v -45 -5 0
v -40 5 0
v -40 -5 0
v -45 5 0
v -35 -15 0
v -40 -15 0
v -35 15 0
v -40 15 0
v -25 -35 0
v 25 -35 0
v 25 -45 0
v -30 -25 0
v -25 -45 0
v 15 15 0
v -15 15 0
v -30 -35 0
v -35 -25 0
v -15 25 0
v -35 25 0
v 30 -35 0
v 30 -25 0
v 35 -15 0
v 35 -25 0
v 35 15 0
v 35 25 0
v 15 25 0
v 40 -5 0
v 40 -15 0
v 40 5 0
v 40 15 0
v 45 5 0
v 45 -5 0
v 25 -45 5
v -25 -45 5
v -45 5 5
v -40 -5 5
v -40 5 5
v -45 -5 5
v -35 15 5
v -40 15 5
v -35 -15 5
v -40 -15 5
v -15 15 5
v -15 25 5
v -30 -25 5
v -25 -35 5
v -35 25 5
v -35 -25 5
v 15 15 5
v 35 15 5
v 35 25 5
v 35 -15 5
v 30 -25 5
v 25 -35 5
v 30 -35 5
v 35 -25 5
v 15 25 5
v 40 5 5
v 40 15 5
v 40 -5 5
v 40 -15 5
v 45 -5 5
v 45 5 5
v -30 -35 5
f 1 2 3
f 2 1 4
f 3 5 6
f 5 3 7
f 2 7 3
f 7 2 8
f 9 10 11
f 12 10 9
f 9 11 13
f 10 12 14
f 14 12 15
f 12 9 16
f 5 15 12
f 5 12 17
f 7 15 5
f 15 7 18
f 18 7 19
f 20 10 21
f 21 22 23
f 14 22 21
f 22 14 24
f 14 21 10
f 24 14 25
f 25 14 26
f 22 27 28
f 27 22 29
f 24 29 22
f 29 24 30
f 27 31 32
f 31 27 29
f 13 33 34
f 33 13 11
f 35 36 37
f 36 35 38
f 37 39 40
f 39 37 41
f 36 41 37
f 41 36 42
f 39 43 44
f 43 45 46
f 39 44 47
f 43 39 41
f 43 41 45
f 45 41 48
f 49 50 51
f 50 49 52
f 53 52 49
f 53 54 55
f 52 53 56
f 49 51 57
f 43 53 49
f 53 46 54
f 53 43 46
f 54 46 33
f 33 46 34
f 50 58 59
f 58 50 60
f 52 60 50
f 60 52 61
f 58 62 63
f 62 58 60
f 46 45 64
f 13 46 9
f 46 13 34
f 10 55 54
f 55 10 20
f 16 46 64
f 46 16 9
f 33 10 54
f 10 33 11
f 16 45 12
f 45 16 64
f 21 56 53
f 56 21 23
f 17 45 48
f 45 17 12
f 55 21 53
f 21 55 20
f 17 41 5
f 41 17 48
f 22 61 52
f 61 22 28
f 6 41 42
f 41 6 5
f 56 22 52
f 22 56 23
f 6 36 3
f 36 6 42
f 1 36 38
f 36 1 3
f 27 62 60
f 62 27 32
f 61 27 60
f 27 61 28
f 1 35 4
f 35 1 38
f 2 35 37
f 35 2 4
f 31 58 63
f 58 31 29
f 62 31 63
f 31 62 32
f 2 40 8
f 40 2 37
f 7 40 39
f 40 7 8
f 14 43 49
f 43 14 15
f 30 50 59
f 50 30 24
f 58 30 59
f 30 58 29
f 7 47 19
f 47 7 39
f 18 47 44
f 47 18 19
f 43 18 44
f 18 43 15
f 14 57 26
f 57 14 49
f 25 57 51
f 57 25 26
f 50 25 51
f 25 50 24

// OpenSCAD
// file: ../../src/semi_regular/tess_4_8_8.scad
/*
    Tessella: Semi-Regular Tessellation - 4.8.8
    ===========================================
    This module implements the tessellation of a plane using a semi-regular tiling
    pattern defined by the vertex configuration 4.8.8, where one square and two
    octagons meet at each vertex.
*/

include <../tessUtils.scad>;

/**
 * @brief Generates center points for an octagonal grid.
 *
 * Creates a 2D grid of center points for octagons spaced by the octagon's side length.
 *
 * @param radius The radius of each octagon.
 * @param n The number of octagons along the x-axis.
 * @param m The number of octagons along the y-axis.
 * @param rotate (Optional) Boolean to apply rotation to the grid, default is true.
 * @return An array of center points for octagons.
 */
function octagons_centers_rect(
    radius,
    n,
    m
) =
    let (
        side_length = (radius * 2) / (sqrt(4 + 2 * sqrt(2))), // Side length of the octagon
        total_width = side_length * (1 + sqrt(2)) // Total width including spacing
    ) squares_centers_rect(total_width, n, m);

/**
 * @brief Generates center points for the squares in a 4.8.8 tiling grid.
 *
 * Aligns the square centers with the octagonal centers by using a shifted grid,
 * creating the required semi-regular tiling pattern.
 *
 * @param radius The radius of the octagons.
 * @param n The number of octagons along the x-axis.
 * @param m The number of octagons along the y-axis.
 * @return An array of center points for squares.
 */
function squares_8_8_centers_rect(radius, n, m) =
    let (
        side_length = (radius * 2) / (sqrt(4 + 2 * sqrt(2))), // Side length of the octagon
        total_width = side_length * (1 + sqrt(2)), // Total width including spacing
        shift_x = total_width / 2, // Horizontal shift for squares
        shift_y = total_width / 2 // Vertical shift for squares
    ) [for (c = squares_centers_rect(total_width, n - 1, m - 1)) [c[0] + shift_x, c[1] + shift_y]];

/**
 * @brief Generates vertices for octagons based on radius and center points.
 *
 * Generates the vertices for octagons based on the provided center points and radius.
 *
 * @param radius The radius of each octagon.
 * @param centers Array of center points.
 * @param angular_offset (Optional) Rotation angle for vertices, default is 22.5°.
 * @return Array of vertices for each octagon.
 */
function octagons_vertices(radius, centers, angular_offset = 22.5) =
    [
        for (center = centers) [
            for (i = [0:7]) let (
                angle = i * 45 + angular_offset
            ) [center[0] + radius * cos(angle), center[1] + radius * sin(angle)],
        ],
    ];
// file: ../../src/regular/triangles.scad
/*
    Tessella: Regular Tessellation - Triangles
    ==========================================
    This module implements the tessellation of a plane using regular triangles,
    where each tile is congruent, and all vertex angles around a point sum to 360°.

    Polygon properties:
    - Sides: 3
    - Interior Angle: 60°
    - Vertex Configuration: 3.3.3.3.3.3

    Mathematically valid because the interior angle divides 360° exactly.
    Reference: Euclidean tessellation theory for regular polygons.
*/

include <../tessUtils.scad>;

/**
 * @brief Generates center points for a "levels-based" triangle arrangement.
 *
 * Creates a roughly radial or diamond-like pattern of triangle centers. The center row
 * has (2*levels - 1) triangles, each additional row above/below decreases by 1 triangle.
 *
 * @param side   The side length of each equilateral triangle.
 * @param levels Number of levels away from the center row.
 * @return       An array of center points for triangles.
 */
function triangles_centers_radial(side, levels) =
    let (
        // Vertical height of each triangle
        vheight = side * sqrt(3) / 2,
        // Generate rows symmetrically around the center
        rows0 = [
            for (i = [-ceil(levels / 2 - 1):ceil(levels / 2 - 1)])
            let (
                rowCount = (levels - ( (levels + 1) % 2)) - abs(i), // Number of triangles in the row
                yOff = i * vheight, // Vertical offset for the row
                xStart = -(rowCount - 1) * side / 2 // Horizontal start to center the row
            ) [[xStart, yOff], rowCount],
        ],
        rows1 = (levels == 1) ? []
        : [
            for (i = [-(floor(levels / 2)):(floor(levels / 2 - 1))])
            let (
                rowCount = (levels - ( (levels) % 2)) - abs(i), // Number of triangles in the row
                yOff = i * vheight + vheight / 2 - (vheight - sqrt(3) / 3 * side) / 2, // Vertical offset for the row
                xStart = -(rowCount - 1) * side / 2 // Horizontal start to center the row
            ) [[xStart, yOff], rowCount],
        ],
        rows = concat(rows0, rows1)
    )
    // Generate center points for all rows
    [for (row = rows) for (j = [0:row[1] - 1]) [row[0][0] + j * side, row[0][1]]];

/**
 * @brief Generates center points for a rectangular grid of equilateral triangles (n x m).
 *
 * Alternating rows are horizontally offset by half a side for a typical triangular tiling pattern.
 *
 * @param side The side length of each triangle.
 * @param n    Number of triangles along x-axis.
 * @param m    Number of rows (y-axis).
 * @return     An array of center points for triangles.
 */
function triangles_centers_rect(side, n, m) =
    let (
        vheight = side * sqrt(3) / 2, // Vertical height of each triangle
        col_shift = side / 2, // Horizontal shift for each column
        row_shift = vheight, // Horizontal shift for alternating rows
        offset_shift = row_shift - (vheight - sqrt(3) / 3 * side) * 2
    ) [for (j = [0:m - 1], i = [0:n - 1]) [(i) * row_shift + (offset_shift * (j % 2)), j * col_shift]];

/**
 * @brief Generates vertices for equilateral triangles at specified centers.
 *
 * Rotates every other row by 180° and applies an additional angular offset for customization.
 *
 * @param side           The side length of each triangle.
 * @param centers        The array of center points for the triangles.
 * @param angular_offset An additional angular offset to apply to all triangles.
 * @param is_radial      If true, calculates the row index based on radial arrangement.
 * @return               A nested array of vertices for all triangles.
 */
function triangle_vertices(side, centers, angular_offset = 0, rect = true) =
    let (
        EPSILON = 1e-9, // Small value for floating-point comparison
        vheight = side * sqrt(3) / 2, // Vertical height of each triangle
        // This messy line pretty much determines if a row is odd or even based on the vertical position, it needs to check
        // using the reverse calculation of rows1 / offset shift, looking at that now it should probably be refactored.
        // Overall, this works and gets the geometrical idea across, but it's not the most readable (literally horrendous).
        row_parity = [
            for (c = centers) (
                (
                    ( ( ( (rect ? c[0] : c[1]) + EPSILON - vheight / 2 + (vheight - sqrt(3) / 3 * side) / 2) / vheight) % 1) <= EPSILON
                ) && (
                    (
                        ( ( (rect ? c[0] : c[1]) - EPSILON - vheight / 2 + (vheight - sqrt(3) / 3 * side) / 2) / vheight) % 1
                    ) >= -EPSILON
                ) ? 0
                : 1
            ),
        ], // Calculate row parity
        rotation_adjustment = [
            for (i = [0:len(centers) - 1]) (
                row_parity[i] ? (rect ? 0 : 180)
                : (rect ? 180 : 0)
            ),
        ] // Flip every other row
    ) [
            for (i = [0:len(centers) - 1]) [
                for (j = [0:2]) let (
                    angle = j * 120 + angular_offset + rotation_adjustment[i]
                ) [
                        centers[i][0] + side / sqrt(3) * cos(angle),
                        centers[i][1] + side / sqrt(3) * sin(angle),
                ],
            ],
    ];
// file: ../../src/regular/squares.scad
/*
    Tessella: Regular Tessellation - Squares
    ========================================
    This module implements the tessellation of a plane using regular squares,
    where each tile is congruent, and all vertex angles around a point sum to 360°.

    Polygon properties:
    - Sides: 4
    - Interior Angle: 90°
    - Vertex Configuration: 4.4.4.4
*/

include <../tessUtils.scad>;

/**
 * @brief Generates center points for a "levels-based" square arrangement.
 *
 * Creates a diamond-like pattern of square centers. The center (middle) row has (2*levels - 1) squares.
 * Each additional row above or below the center has one fewer square, until only 1 square remains at the
 * top and bottom (when levels > 1).
 *
 * @param side   The side length of each square.
 * @param levels Number of levels (rows above the center, plus the center, plus rows below).
 * @return       An array of center points for squares.
 */
function squares_centers_radial(side, levels) =
    let (
        // Offsets for spacing
        offset_x = side, // Horizontal spacing
        offset_y = side, // Vertical spacing

        // Generate rows from the center outward
        // Row i = -(levels-1) to +(levels-1), where i=0 is the center row.
        rows = [
            for (i = [-(levels - 1):(levels - 1)])
            let (
                rowCount = (2 * levels - 1) - abs(i), // Number of squares in the row
                yOff = i * offset_y, // Vertical position of the row
                xStart = -(rowCount - 1) * offset_x / 2 // Horizontal start to center the row
            ) [[xStart, yOff], rowCount],
        ]
    )
    // For each row definition, generate square center points
    [for (row = rows) for (j = [0:row[1] - 1]) [row[0][0] + j * offset_x, row[0][1]]];

/**
 * @brief Generates center points for a rectangular grid of squares (n x m).
 *
 * Produces a 2D grid of center points spaced by side length in both x and y directions.
 *
 * @param side The side length of each square.
 * @param n    The number of squares along the x-axis.
 * @param m    The number of squares along the y-axis.
 * @return     An array of center points for squares.
 */
function squares_centers_rect(side, n, m) =
    let (offset_x = side, offset_y = side) [for (ix = [0:n - 1], iy = [0:m - 1]) [ix * offset_x, iy * offset_y]];

/**
 * @brief Renders 2D squares at specified centers, with optional color gradient.
 *
 * @param side          The side length of each square.
 * @param spacing       (Optional) Spacing between squares, default is 0.
 * @param centers       (Optional) Array of center points. If empty, `levels` or (n,m) must be provided.
 * @param levels        (Optional) Number of levels for diamond-like pattern generation.
 * @param n, m          (Optional) Grid dimensions if using NxM generation.
 * @param color_scheme  (Optional) Name of the color scheme for gradient.
 * @param alpha         (Optional) Alpha transparency value.
 */

function squares_vertices(side, centers, angular_offset = 45) =
    [
        for (
            center = centers
        ) [
            for (i = [0:3]) let (angle = i * 90 + angular_offset) [
                    center[0] + side / sqrt(2) * cos(angle),
                    center[1] + side / sqrt(2) * sin(angle),
            ],
        ],
    ];
// file: ../../src/regular/hexagons.scad
/*
    Tessella: Regular Tessellation - Hexagons
    =========================================
    Tessellates a plane using regular hexagons.
    Properties:
    - Sides: 6
    - Interior Angle: 120°
    - Vertex Configuration: 6.6.6
*/

include <../tessUtils.scad>;

/**
 * Generates center points for a hexagonal tessellation in a radial pattern.
 * @param radius The radius of each hexagon.
 * @param levels Number of radial levels.
 * @return Array of hexagon center points.
 */
function hexagons_centers_radial(radius, levels) =
    let (
        offset_x = radius * cos(30),
        offset_y = radius + radius * sin(30),
        offset_step = 2 * offset_x,
        dx = -(levels - 1) * offset_x * 2,
        beginning_n = 2 * levels - 1,
        hexagons_pts = function(hex_datum)
        let (
            tx = hex_datum[0][0] + dx,
            ty = hex_datum[0][1],
            n_pts = hex_datum[1],
            offset_xs = [for (i = [0:n_pts - 1]) i * offset_step]
        ) [for (x = offset_xs) [x + tx, ty]],
        upper_hex_data = levels > 1 ? [
                for (i = [1:beginning_n - levels]) let (
                    x = offset_x * i,
                    y = offset_y * i,
                    n_upper = beginning_n - i
                ) [[x, y], n_upper],
            ]
        : [],
        lower_hex_data = levels > 1 ? [for (hex_datum = upper_hex_data) [[hex_datum[0][0], -hex_datum[0][1]], hex_datum[1]]]
        : [],
        total_hex_data = [[[0, 0], beginning_n], each upper_hex_data, each lower_hex_data],
        centers = [for (hex_datum = total_hex_data) hexagons_pts(hex_datum)]
    ) concat([for (c = centers) each c]);

/**
 * Generates center points for a rectangular hexagonal grid.
 * @param radius The radius of each hexagon.
 * @param n Number of hexagons along x-axis.
 * @param m Number of hexagons along y-axis.
 * @return Array of hexagon center points.
 */
function hexagons_centers_rect(radius, n, m) =
    let (
        offset_x = radius * cos(30),
        offset_y = radius + radius * sin(30),
        offset_step = 2 * offset_x
    ) [for (i = [0:n - 1], j = [0:m - 1]) [i * offset_step + (j % 2) * (offset_step / 2), j * offset_y]];

/**
 * Generates vertices for hexagons based on radius and center points.
 * @param radius The radius of each hexagon.
 * @param centers Array of center points.
 * @param angular_offset Rotation angle for vertices.
 * @return Array of vertices for each hexagon.
 */
function hexagons_vertices(radius, centers, angular_offset = 30) =
    [
        for (center = centers) [
            for (i = [0:5]) let (
                angle = i * 60 + angular_offset
            ) [center[0] + radius * cos(angle), center[1] + radius * sin(angle)],
        ],
    ];
// file: ../../src/tessUtils.scad
EPSILON = 1e-3; ///< Tolerance value used for floating-point comparisons.

/**
 * @brief Generates a gradient color based on normalized coordinates and a color scheme.
 *
 * Selects a color by mapping normalized x and y coordinates to RGB values according to the specified color scheme.
 *
 * @param normalized_x The normalized x-coordinate (0 to 1).
 * @param normalized_y The normalized y-coordinate (0 to 1).
 * @param color_scheme The name of the color scheme to use.
 * @return An RGB color array [r, g, b].
 */
function get_gradient_color(normalized_x, normalized_y, color_scheme) =
    color_scheme == "scheme1" ? [normalized_x, 1 - normalized_x, normalized_y]
    : // Red to Blue
    color_scheme == "scheme2" ? [1 - normalized_y, normalized_x, normalized_y]
    : // Green to Magenta
    color_scheme == "scheme3" ? [normalized_y, 1 - normalized_y, normalized_x]
    : // Blue to Yellow
    color_scheme == "scheme4" ? [1 - normalized_x, normalized_x, 1 - normalized_y]
    : // Cyan to Red
    color_scheme == "scheme5" ? [normalized_x, normalized_x * normalized_y, 1 - normalized_x]
    : // Purple to Green
    color_scheme == "scheme6" ? [1 - normalized_x * normalized_y, normalized_y, normalized_x]
    : // Orange to Blue
    [0.9, 0.9, 0.9]; // Default color (grey) if no valid color scheme is provided

/**
 * @brief Renders points as text labels and optional spheres in the 3D space.
 *
 * Displays each point's coordinates as text at its location and optionally places a sphere at the point.
 *
 * @param points An array of points to display, each as [x, y].
 * @param text_size (Optional) Size of the text labels; default is 1.
 * @param color (Optional) Color of the text labels; default is [0.1, 0.1, 0.1].
 * @param pointD (Optional) Diameter of the sphere to place at each point; if undef, no sphere is placed.
 * @param point_color (Optional) Color of the spheres; default is [0.1, 0.1, 0.1].
 * @param fn (Optional) Number of facets for the spheres; default is 8.
 */
module print_points(
    points,
    text_size = 1,
    color = [0.1, 0.1, 0.1],
    pointD = undef,
    point_color = [0.1, 0.1, 0.1],
    fn = 8
) {
    for (point = points) {
        // Translate +1 in Z-axis to avoid z-fighting with the surface
        translate([point[0], point[1] + pointD * 2, pointD * 2]) color(color)
                text(str("[", point[0], ", ", point[1], "]"), size=text_size, valign="center", halign="center");
        if (pointD != undef) {
            // Place a sphere at the point if pointD is specified
            color(point_color) translate([point[0], point[1], 0]) sphere(pointD, $fn=fn);
        }
    }
}

/**
 * @brief Checks if two points are equal within a specified tolerance.
 *
 * @param p1 First point as [x, y].
 * @param p2 Second point as [x, y].
 * @param tolerance (Optional) Tolerance value for comparison; default is EPSILON.
 * @return True if points are equal within tolerance, false otherwise.
 */
function points_equal(p1, p2, tolerance = EPSILON) =
    let (
        comparisons = [
            for (i = [0:len(p1) - 1]) abs(p1[i] - p2[i]) < tolerance,
        ]
    )
    // Check if all comparisons are true
    len([for (comp = comparisons) if (comp) true]) == len(comparisons);

/**
 * @brief Checks if a point exists within a list of points, within a specified tolerance.
 *
 * @param point The point to check, as [x, y].
 * @param list The list of points to search within.
 * @param tolerance (Optional) Tolerance value for comparison; default is EPSILON.
 * @return True if the point exists in the list within tolerance, false otherwise.
 */
function is_point_in_list(
    point,
    list,
    tolerance = EPSILON
) =
    let (equal_points = [for (p = list) points_equal(p, point, tolerance)]) len([for (eq = equal_points) if (eq) true]) > 0;

/**
 * @brief Filters out centers that are present in a filter list.
 *
 * Removes centers from the provided list that match any in the filter_list, within a specified tolerance.
 *
 * @param centers An array of centers to be filtered.
 * @param filter_list An array of centers to filter out.
 * @param tolerance (Optional) Tolerance value for comparison; default is EPSILON.
 * @return A filtered array of centers.
 */
function filter_center_points(centers, filter_list, tolerance = EPSILON) =
    [for (center = centers) if (!is_point_in_list(center, filter_list, tolerance)) center];

/** 
 * @brief Renders a generic polygon shape with optional extrusion and color gradient.
 *
 * This module allows rendering of polygons defined by vertices and paths, with optional extrusion for 3D effects.
 * It supports color gradients based on center points and a specified color scheme.
 *
 * @param vertices An array of vertices for the polygon.    
 * @param paths An array of paths defining the polygon.
 * @param centers (Optional) An array of center points for each polygon, used for color gradient.
 * @param color_scheme (Optional) A string defining the color scheme for the gradient.
 * @param alpha (Optional) Transparency level for the color; default is 1 (opaque).
 * @param extrude (Optional) Height for linear extrusion; if undef, no extrusion is applied.
 * @return Renders the polygon with the specified properties.
 */

module generic_poly(vertices, paths, centers = undef, color_scheme = undef, alpha = 1, extrude = undef) {
    if (!is_undef(color_scheme) && !is_undef(centers)) {
        // Compute normalization bounds
        min_x = min([for (center = centers) center[0]]);
        max_x = max([for (center = centers) center[0]]);
        min_y = min([for (center = centers) center[1]]);
        max_y = max([for (center = centers) center[1]]);

        for (i = [0:len(vertices) - 1]) {
            // Normalize coordinates for color gradient
            normalized_x = (centers[i][0] - min_x) / (max_x - min_x + 1e-9);
            normalized_y = (centers[i][1] - min_y) / (max_y - min_y + 1e-9);

            // Get color value
            color_val = get_gradient_color(normalized_x, normalized_y, color_scheme);

            // Render the shape
            color(color_val, alpha=alpha) if (!is_undef(extrude))
                linear_extrude(height=extrude)
                    polygon(points=vertices[i], paths=paths);
            else
                polygon(points=vertices[i], paths=paths);
        }
    } else {
        for (i = [0:len(vertices) - 1]) {
            // Render the shape without a color gradient
            if (!is_undef(extrude))
                linear_extrude(height=extrude) polygon(points=vertices[i], paths=paths);
            else
                polygon(points=vertices[i], paths=paths);
        }
    }
}
// file: ../../tess.scad
/**
 * @file tess.scad
 * @brief Functions and modules for generating tessellation patterns and rendering shapes.
 * @author Cameron K. Brooks
 * @copyright 2024
 * @info This file serves as an index file to allow for blind importing of all tessellation modules.
 *
 */

// Import utility modules
include <src/tessUtils.scad>

// Import regular tessellation modules

include <src/regular/hexagons.scad>; // Contains hexagon tessellation functions & assets
include <src/regular/squares.scad>; // Contains square tessellation functions & assets
include <src/regular/triangles.scad>; // Contains triangle tessellation functions & assets

// Import semi-regular (Archimedean) tessellation modules
include <src/semi_regular/tess_4_8_8.scad>; // Contains 4.8.8 tessellation functions & octagon assets
// main file
// Radial squares
// Five levels of squares of side 10 with no gap.

use <../../tess.scad>

side = 10; // Side length of each square
spacing = 0; // Spacing between squares
lvls = 5; // Number of levels
extHeight = 10; // Extrusion height for squares
filter = true; // Enable or disable filtering

// Generate unfiltered center points
unfiltered_centers = squares_centers_radial(side, lvls);
echo("Unfiltered Centers:", unfiltered_centers);

// Use the echo output to define the desired filter points
filter_points_radial = [
    [-20, 40],
    [-10, 40],
    [0, 40],
    [10, 40],
    [20, 40],
    [0, 20],
    [-10, 20],
    [10, 20],
    [25, 30],
    [15, 30],
    [5, 30],
    [-5, 30],
    [-15, 30],
    [-25, 30],
];

// Filter the center points if filtering is enabled
filtered_centers = filter_center_points(unfiltered_centers, filter_points_radial);
echo("Filtered Centers:", filtered_centers);

// Use filtered or unfiltered center points
centers = filter ? filtered_centers : unfiltered_centers;

// Generate vertices for the squares
vertices = squares_vertices(side=side - spacing, centers=centers);

// Render the squares
generic_poly(
    vertices=vertices, paths=[[0, 1, 2, 3, 0]], centers=centers, color_scheme="scheme1", alpha=1,
    extrude=5
);
// Note:
// - The 'centers' parameter is used only for calculating the color scheme.
//   If no color scheme is needed, this parameter can be omitted.
// - The 'vertices' parameter is mandatory for defining the geometry of the tessellation.
// - The 'paths' parameter defines the connectivity of vertices to form each shape.
//   For example, [[0, 1, 2, 3, 0]] represents a square connecting vertices in order.
// - If only a flat visualization of the tessellation is required, the 'extrude' parameter can be omitted.
//   For example:
//   generic_poly(vertices = vertices, paths = [[0, 1, 2, 3, 0]]);

// Render points for debugging
translate([0, 0, extHeight])
    print_points(centers, text_size=1, color="Blue", pointD=0.5, point_color="Red", fn=12);
